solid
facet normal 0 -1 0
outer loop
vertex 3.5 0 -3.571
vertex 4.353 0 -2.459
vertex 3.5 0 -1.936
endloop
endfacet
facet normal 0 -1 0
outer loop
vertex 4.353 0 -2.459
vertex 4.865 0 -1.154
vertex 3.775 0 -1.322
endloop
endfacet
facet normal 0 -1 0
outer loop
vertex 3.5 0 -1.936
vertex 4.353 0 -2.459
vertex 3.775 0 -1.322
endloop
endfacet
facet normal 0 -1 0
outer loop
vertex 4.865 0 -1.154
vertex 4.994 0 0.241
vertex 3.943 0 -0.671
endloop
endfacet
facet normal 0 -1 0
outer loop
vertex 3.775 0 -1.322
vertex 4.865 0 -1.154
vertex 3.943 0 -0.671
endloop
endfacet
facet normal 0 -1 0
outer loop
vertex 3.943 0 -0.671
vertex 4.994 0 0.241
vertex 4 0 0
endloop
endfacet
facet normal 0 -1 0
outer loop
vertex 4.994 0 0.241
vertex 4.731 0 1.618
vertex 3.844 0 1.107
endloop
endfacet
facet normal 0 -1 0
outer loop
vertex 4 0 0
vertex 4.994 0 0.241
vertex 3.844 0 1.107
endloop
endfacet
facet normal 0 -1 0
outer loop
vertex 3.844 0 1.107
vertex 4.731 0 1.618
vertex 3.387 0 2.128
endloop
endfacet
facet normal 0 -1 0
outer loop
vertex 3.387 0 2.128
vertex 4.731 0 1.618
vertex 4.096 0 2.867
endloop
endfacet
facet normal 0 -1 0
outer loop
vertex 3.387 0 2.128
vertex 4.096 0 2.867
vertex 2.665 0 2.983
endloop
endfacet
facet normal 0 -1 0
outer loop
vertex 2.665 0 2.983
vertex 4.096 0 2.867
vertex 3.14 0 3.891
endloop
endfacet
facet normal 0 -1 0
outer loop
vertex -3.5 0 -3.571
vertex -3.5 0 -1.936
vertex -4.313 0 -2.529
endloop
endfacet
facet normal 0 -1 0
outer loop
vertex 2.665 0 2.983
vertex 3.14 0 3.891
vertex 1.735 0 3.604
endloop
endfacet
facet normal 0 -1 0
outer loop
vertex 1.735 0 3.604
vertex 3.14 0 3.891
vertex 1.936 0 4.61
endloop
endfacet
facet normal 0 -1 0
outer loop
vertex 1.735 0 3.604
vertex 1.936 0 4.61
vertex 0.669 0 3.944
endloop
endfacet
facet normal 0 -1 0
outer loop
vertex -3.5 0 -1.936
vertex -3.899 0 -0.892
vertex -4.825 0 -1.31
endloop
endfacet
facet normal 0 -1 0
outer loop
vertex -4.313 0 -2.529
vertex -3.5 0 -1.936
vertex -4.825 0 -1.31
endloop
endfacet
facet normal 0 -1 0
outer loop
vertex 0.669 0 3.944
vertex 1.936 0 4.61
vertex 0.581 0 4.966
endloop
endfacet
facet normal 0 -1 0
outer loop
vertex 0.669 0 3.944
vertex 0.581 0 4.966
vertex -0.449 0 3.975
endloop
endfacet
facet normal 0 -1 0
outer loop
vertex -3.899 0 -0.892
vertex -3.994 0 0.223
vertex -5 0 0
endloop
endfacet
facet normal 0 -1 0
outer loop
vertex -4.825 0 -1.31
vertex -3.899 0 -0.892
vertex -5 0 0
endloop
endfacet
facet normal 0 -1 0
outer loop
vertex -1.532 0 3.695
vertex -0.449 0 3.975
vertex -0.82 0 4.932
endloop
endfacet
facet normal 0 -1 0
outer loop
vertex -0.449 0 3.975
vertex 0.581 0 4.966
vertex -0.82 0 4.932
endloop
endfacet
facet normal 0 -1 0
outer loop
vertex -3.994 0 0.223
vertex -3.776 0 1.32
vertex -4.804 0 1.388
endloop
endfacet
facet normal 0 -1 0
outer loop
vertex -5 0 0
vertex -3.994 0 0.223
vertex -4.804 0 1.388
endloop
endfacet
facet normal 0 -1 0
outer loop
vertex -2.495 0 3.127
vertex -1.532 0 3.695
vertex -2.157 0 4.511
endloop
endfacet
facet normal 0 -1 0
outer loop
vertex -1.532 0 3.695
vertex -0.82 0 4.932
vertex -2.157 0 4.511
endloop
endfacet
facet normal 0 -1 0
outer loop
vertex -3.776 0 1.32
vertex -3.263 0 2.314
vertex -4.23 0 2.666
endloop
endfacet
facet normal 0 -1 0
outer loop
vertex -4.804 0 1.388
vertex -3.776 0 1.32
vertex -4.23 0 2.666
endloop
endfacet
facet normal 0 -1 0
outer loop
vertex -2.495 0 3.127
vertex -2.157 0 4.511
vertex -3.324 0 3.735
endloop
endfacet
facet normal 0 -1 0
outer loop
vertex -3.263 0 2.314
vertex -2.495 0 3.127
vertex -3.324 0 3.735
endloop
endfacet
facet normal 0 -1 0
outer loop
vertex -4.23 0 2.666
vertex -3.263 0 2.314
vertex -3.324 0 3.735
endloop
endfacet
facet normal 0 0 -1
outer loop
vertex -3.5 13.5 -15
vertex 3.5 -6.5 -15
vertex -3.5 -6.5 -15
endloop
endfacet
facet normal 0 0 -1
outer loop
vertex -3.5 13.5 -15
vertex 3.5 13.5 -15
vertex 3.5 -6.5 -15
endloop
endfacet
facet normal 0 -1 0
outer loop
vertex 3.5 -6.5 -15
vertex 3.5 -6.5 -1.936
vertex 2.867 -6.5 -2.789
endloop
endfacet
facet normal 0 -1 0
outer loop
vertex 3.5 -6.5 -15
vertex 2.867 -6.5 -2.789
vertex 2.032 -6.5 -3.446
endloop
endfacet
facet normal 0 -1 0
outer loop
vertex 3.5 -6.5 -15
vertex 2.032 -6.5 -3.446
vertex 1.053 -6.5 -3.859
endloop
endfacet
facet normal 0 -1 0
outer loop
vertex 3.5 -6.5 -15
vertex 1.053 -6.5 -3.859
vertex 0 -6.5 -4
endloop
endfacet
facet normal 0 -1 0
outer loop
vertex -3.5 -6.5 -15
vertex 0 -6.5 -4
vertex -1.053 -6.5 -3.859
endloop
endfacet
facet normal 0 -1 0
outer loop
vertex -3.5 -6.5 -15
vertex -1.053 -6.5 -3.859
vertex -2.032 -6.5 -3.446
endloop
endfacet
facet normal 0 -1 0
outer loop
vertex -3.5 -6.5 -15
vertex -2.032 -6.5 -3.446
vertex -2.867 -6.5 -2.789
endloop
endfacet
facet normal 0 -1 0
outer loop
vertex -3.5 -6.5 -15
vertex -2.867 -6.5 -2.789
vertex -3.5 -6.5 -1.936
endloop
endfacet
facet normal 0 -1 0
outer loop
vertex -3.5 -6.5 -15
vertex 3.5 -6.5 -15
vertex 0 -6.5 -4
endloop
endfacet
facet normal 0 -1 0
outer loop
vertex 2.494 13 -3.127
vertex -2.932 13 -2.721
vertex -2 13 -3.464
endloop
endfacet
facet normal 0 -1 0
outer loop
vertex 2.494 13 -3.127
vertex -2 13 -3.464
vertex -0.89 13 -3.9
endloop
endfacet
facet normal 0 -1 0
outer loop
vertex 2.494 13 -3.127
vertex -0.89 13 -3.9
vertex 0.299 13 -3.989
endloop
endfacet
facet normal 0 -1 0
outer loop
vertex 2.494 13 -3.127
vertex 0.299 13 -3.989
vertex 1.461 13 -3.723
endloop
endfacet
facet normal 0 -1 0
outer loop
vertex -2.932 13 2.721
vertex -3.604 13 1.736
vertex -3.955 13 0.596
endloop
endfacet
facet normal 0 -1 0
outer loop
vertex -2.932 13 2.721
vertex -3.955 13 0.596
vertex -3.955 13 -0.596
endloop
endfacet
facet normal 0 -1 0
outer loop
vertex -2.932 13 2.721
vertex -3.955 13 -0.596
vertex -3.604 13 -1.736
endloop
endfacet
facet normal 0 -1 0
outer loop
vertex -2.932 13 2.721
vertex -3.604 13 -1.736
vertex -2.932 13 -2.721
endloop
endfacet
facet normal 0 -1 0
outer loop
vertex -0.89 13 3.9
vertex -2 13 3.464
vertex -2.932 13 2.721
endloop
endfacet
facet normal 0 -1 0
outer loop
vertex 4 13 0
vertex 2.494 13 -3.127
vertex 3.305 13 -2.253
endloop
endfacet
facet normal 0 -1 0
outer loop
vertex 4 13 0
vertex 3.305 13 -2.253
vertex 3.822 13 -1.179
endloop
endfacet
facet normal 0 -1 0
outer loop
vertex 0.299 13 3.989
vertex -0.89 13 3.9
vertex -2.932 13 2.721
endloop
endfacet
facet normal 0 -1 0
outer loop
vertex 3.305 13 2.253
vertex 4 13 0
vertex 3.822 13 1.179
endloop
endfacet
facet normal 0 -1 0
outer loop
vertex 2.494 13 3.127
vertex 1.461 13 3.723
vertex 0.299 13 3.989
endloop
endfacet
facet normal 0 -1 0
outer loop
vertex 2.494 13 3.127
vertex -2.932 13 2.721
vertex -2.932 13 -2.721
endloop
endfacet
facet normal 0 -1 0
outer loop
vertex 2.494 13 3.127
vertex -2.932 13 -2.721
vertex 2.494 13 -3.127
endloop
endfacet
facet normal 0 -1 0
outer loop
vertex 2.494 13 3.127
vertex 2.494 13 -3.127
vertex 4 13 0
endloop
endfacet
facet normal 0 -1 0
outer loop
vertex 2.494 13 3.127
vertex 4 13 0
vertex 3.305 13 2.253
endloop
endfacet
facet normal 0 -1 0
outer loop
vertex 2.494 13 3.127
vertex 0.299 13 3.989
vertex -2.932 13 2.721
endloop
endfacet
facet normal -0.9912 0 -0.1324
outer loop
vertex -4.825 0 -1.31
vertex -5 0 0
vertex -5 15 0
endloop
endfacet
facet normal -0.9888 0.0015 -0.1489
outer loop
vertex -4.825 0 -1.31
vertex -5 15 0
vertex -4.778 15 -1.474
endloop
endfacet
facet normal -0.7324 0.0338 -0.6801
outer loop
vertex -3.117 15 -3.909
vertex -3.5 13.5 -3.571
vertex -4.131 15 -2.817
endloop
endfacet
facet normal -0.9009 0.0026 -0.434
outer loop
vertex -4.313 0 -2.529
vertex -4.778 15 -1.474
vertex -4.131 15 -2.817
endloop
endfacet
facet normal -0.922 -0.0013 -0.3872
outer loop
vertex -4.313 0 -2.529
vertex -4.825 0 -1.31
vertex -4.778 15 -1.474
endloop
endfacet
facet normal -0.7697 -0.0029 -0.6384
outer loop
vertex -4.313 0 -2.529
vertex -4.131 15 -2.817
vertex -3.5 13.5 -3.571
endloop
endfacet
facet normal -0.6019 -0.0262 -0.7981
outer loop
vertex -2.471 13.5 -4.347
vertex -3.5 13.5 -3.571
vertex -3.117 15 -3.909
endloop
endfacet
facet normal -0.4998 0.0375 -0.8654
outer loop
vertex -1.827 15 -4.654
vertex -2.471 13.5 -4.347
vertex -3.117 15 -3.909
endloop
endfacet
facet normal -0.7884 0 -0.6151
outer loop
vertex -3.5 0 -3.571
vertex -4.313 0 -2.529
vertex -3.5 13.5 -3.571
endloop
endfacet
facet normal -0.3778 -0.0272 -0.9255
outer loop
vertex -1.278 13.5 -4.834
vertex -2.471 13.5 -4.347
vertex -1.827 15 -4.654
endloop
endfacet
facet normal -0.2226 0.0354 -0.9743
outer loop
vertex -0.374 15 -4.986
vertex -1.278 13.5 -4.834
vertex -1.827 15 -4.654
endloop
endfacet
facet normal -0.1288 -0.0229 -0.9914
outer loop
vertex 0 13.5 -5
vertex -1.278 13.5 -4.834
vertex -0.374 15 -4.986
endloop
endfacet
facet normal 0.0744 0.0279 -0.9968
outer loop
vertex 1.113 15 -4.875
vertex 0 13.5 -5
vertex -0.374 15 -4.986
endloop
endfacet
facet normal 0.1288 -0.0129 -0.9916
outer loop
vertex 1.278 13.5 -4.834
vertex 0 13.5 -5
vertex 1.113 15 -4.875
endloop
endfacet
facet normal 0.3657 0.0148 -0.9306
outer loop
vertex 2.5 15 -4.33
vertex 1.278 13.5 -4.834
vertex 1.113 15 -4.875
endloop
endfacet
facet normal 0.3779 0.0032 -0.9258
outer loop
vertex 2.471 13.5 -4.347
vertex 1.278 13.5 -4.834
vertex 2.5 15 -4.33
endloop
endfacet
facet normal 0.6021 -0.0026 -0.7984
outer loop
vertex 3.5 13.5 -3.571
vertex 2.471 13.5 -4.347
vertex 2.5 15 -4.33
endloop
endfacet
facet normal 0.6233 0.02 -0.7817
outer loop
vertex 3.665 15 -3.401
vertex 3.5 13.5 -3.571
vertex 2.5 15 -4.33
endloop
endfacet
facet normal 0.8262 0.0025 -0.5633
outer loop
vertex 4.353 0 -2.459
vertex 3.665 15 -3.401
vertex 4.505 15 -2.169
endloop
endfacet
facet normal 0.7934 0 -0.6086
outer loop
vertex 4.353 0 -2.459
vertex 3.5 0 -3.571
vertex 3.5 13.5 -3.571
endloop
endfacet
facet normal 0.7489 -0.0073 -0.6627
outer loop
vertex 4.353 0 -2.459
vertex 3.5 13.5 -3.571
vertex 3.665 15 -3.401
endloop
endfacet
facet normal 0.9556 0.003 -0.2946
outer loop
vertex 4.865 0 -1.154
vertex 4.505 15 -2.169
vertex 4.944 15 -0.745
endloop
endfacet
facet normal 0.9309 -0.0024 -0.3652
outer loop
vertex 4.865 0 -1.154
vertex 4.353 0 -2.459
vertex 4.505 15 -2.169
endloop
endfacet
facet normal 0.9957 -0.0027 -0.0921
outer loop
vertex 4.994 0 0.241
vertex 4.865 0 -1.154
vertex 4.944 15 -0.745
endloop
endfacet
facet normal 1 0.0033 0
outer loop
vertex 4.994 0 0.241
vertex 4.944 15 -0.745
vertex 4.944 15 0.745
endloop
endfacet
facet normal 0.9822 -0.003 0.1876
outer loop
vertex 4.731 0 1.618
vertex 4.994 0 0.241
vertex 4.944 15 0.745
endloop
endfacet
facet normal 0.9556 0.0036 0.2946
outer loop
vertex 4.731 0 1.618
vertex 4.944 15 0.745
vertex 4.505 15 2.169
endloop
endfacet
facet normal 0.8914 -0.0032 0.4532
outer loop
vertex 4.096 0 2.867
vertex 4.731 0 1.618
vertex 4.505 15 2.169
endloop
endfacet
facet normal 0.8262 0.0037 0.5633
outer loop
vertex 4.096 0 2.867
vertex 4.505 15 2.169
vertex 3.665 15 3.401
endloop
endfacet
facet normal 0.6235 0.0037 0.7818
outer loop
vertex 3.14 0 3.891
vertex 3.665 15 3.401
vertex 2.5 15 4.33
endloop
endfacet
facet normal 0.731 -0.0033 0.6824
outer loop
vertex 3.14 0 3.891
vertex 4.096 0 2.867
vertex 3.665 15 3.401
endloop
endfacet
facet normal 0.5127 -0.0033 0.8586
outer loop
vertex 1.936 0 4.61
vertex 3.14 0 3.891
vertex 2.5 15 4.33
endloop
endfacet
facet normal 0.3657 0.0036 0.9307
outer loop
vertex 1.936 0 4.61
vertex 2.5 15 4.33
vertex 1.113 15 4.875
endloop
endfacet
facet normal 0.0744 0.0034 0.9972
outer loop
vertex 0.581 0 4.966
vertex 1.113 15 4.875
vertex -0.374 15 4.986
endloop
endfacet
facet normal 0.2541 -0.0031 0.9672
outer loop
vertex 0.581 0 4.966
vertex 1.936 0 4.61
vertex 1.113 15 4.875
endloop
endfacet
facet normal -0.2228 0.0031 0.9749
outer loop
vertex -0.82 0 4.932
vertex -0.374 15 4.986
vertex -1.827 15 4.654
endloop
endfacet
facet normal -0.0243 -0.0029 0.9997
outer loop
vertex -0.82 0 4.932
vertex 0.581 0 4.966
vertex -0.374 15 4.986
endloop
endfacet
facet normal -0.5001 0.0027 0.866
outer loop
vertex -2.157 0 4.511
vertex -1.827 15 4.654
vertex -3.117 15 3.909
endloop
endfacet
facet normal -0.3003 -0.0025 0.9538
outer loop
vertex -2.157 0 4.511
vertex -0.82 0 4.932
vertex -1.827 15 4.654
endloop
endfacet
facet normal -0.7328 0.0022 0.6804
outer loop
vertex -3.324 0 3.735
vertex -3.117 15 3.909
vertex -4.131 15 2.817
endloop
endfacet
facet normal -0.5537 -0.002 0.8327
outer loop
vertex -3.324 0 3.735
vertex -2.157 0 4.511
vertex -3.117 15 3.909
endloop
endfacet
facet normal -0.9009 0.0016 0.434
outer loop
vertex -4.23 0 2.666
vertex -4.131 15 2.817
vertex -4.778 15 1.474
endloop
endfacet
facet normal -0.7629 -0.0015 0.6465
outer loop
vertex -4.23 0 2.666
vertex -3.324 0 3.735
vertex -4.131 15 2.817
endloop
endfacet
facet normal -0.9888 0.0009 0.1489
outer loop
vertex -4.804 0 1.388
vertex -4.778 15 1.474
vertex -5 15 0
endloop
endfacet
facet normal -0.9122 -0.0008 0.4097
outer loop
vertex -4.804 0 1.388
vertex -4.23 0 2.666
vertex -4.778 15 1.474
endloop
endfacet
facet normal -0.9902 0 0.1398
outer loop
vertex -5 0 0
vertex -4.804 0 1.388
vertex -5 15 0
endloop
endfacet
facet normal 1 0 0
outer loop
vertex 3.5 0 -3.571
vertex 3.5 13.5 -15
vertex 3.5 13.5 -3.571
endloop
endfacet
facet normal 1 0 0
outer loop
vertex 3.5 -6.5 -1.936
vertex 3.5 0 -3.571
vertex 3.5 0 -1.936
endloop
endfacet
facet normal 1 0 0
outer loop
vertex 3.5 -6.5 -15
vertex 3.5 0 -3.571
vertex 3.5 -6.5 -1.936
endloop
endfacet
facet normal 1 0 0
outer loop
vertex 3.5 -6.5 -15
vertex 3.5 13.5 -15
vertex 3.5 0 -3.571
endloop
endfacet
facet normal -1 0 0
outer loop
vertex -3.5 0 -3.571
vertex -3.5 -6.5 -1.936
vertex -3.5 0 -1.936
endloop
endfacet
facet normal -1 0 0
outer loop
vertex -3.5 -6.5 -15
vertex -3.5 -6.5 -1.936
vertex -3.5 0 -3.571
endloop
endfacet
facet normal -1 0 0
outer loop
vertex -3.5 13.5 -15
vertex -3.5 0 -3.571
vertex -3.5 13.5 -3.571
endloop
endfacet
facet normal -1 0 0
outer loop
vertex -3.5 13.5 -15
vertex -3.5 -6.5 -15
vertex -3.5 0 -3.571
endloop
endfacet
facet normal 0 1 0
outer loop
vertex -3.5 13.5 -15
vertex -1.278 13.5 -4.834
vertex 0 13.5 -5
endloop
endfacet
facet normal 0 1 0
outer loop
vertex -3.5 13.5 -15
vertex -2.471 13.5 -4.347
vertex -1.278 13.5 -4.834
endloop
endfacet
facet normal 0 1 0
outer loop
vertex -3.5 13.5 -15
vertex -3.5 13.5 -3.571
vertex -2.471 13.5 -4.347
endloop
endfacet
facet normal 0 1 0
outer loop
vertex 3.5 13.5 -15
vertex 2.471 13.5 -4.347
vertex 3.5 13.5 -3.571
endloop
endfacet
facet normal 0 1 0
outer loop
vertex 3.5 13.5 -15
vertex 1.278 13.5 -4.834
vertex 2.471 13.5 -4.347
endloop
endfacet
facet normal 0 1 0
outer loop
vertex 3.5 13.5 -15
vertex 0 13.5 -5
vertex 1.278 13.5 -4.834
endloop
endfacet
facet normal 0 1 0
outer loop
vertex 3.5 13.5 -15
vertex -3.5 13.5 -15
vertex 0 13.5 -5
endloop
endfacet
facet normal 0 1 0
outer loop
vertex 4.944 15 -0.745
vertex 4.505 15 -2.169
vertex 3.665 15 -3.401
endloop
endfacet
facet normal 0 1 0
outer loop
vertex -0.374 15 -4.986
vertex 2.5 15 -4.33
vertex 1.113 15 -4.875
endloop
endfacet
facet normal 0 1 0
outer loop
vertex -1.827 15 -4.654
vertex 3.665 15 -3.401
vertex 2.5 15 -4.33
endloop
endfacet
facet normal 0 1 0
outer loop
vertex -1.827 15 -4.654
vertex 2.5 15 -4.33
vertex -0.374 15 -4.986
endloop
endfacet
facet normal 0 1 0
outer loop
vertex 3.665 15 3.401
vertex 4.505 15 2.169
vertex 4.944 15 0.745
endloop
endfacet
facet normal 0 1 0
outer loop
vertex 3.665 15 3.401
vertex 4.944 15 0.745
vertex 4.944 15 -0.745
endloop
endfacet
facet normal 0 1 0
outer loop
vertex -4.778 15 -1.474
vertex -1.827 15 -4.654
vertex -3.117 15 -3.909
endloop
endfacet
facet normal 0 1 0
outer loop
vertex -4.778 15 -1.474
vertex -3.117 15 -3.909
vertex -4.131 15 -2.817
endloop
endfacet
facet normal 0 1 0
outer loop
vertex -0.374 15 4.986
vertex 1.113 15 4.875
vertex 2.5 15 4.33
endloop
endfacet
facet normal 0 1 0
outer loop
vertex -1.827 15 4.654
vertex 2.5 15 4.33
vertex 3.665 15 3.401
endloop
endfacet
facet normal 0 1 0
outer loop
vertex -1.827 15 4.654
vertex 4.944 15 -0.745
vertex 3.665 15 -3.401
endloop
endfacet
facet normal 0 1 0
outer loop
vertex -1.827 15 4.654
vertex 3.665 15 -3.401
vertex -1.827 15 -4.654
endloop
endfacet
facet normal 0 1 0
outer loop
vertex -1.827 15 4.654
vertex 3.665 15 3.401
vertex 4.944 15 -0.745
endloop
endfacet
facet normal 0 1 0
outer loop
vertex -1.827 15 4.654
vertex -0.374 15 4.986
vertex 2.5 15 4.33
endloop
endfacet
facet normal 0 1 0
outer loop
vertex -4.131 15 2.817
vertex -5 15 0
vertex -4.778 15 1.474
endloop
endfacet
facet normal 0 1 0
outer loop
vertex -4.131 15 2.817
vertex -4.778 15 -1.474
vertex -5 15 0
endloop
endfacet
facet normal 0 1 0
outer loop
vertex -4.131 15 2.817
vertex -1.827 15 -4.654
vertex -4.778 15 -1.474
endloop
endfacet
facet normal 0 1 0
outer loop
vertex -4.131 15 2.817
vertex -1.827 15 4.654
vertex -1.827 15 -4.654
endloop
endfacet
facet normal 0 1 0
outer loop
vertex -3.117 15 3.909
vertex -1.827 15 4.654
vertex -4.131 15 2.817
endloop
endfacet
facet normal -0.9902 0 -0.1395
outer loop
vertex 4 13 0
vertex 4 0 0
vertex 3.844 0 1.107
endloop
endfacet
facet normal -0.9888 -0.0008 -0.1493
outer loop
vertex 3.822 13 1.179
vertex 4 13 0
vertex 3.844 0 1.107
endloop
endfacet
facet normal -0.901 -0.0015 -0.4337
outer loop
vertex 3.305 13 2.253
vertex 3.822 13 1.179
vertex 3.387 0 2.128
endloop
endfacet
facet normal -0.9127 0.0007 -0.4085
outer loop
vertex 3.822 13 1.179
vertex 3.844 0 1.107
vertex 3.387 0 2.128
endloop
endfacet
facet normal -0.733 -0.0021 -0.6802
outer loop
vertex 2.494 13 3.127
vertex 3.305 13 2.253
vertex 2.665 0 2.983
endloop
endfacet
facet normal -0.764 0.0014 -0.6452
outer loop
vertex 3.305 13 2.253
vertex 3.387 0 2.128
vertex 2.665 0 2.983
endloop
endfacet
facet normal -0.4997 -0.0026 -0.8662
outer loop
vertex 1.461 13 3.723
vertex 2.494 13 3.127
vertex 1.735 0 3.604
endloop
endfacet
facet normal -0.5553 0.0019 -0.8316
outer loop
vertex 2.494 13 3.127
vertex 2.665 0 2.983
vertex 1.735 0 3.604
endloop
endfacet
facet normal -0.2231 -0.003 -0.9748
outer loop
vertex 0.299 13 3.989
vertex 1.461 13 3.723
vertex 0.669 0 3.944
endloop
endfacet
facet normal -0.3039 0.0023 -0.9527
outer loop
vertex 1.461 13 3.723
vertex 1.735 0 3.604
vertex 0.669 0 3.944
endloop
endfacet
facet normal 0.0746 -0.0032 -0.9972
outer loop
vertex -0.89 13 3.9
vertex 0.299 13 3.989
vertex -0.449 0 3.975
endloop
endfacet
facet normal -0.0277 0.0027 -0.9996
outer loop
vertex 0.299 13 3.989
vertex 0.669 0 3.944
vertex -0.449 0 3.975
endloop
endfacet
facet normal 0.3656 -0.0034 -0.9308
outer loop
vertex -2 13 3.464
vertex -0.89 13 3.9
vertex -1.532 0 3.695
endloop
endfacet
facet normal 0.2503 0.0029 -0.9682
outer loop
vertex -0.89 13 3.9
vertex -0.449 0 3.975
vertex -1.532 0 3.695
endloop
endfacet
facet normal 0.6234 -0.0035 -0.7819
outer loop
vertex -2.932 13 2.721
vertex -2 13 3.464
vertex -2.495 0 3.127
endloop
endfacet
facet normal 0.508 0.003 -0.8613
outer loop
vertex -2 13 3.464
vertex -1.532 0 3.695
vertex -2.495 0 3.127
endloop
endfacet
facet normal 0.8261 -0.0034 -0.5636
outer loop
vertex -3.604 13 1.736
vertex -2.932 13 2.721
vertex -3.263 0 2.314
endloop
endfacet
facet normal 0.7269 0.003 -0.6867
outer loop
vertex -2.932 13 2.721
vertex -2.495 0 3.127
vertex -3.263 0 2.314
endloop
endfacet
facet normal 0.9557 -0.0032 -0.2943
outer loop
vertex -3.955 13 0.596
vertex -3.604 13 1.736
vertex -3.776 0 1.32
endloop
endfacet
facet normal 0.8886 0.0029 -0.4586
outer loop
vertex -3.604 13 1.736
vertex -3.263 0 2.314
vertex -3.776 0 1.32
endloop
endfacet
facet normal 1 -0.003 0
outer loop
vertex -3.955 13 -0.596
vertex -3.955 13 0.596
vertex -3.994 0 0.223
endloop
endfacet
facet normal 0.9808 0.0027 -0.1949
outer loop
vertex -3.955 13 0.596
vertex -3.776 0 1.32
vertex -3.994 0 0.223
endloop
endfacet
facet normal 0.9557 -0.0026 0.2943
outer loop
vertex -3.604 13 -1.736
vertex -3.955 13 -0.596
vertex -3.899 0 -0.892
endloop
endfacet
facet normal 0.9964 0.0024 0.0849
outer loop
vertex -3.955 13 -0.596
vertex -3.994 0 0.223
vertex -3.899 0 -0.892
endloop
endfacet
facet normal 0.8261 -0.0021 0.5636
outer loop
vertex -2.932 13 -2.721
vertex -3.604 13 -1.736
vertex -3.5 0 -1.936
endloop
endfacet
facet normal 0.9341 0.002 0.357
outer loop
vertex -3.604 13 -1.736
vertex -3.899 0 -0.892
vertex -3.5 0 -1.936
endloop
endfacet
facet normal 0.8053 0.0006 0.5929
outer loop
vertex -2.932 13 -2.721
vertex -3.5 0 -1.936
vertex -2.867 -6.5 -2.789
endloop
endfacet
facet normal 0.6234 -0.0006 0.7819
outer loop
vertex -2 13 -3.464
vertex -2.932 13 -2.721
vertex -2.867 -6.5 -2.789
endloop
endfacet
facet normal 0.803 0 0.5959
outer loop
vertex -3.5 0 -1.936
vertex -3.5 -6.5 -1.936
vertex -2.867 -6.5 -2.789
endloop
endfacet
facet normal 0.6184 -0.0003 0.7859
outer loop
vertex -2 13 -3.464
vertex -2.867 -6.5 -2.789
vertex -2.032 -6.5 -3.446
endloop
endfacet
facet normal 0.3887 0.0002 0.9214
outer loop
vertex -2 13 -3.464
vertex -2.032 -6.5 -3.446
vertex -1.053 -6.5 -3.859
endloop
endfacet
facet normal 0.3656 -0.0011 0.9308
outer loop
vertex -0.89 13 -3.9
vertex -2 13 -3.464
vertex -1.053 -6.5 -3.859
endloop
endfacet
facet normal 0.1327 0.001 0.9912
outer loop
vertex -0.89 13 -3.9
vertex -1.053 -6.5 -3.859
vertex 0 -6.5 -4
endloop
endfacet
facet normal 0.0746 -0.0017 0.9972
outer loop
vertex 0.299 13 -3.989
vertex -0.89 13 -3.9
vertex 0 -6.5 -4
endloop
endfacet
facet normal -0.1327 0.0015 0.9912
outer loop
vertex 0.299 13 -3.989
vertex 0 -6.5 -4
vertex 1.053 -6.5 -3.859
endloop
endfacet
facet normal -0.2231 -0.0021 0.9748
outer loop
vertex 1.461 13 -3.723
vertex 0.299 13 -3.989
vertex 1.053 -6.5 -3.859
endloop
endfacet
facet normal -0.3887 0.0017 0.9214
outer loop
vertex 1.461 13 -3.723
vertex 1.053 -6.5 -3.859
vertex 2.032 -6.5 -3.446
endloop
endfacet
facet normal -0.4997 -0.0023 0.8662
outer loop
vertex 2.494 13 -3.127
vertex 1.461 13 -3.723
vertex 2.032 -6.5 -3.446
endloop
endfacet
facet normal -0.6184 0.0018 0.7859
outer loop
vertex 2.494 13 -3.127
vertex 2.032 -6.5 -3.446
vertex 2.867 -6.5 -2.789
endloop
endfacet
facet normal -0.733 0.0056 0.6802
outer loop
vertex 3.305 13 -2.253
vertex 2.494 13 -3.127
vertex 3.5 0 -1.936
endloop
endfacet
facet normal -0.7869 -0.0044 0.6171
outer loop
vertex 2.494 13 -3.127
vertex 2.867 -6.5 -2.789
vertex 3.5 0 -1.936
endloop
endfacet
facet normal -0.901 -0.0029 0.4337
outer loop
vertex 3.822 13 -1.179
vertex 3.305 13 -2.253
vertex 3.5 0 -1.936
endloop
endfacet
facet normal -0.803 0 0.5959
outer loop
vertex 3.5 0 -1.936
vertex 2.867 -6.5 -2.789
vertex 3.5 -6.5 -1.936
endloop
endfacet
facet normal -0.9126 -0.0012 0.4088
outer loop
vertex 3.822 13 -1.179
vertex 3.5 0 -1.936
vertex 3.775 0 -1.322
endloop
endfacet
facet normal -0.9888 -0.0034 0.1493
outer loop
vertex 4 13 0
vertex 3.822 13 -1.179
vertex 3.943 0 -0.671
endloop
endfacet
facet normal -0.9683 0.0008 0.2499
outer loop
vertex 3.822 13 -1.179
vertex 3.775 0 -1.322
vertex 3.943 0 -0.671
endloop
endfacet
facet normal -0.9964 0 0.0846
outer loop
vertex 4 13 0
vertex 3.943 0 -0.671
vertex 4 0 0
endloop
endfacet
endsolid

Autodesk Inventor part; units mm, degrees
ref_plane "YZ Plane" through (0, 0, 0) normal (1, 0, 0) x (0, 1, 0)
ref_plane "XZ Plane" through (0, 0, 0) normal (0, 1, 0) x (-1, 0, 0)
ref_plane "XY Plane" through (0, 0, 0) normal (0, 0, 1) x (1, 0, 0)
sketch "スケッチ1" plane through (0, 0, 0) normal (0, 1, 0) x (-1, 0, 0)
  circle A0 centre (0, 0) radius 5
  dimension "d0" = 10
extrude "押し出し1" add sketch "スケッチ1" along normal blind 15
sketch "スケッチ2" plane through (0, 15, 0) normal (0, 1, 0) x (1, 0, 0)
  line L0 (0, 0) -> (0, 5)
  circle A0 centre (0, 0) radius 5 projected
sketch "スケッチ3" plane through (0, 15, 0) normal (0, 1, 0) x (1, 0, 0)
  point P0 (0, 0)
sketch "スケッチ4" plane through (0, 0, 0) normal (0, -1, 0) x (1, 0, 0)
  line L0 (0, 0) -> (0, -5)
  circle A0 centre (0, 0) radius 5 projected
ref_plane "作業平面1" through (0, 0, -5) normal (0, 0, -1) x (-1, 0, 0)
sketch "スケッチ5" plane through (0, 0, -5) normal (0, 0, -1) x (-1, 0, 0)
  line L0 (5, 15) -> (-5, 15) projected
  line L1 (0, 15) -> (0, 0)
sketch "スケッチ7" plane through (0, 0, 0) normal (0, -1, 0) x (1, 0, 0)
  circle A0 centre (0, 0) radius 4
  dimension "d3" = 8
sketch "スケッチ8" plane through (0, 0, -5) normal (0, 0, -1) x (-1, 0, 0)
  line L0 (3.5, 13.5) -> (-3.5, 13.5)
  line L1 (-3.5, 13.5) -> (-3.5, -6.5)
  line L2 (-3.5, -6.5) -> (3.5, -6.5)
  line L3 (3.5, -6.5) -> (3.5, 13.5)
  line L4 (5, 15) -> (-5, 15) projected
  line L5 (0, 15) -> (0, 0) projected
  line L6 (5, 0) -> (5, 15) projected
  line L7 (5, 15) -> (-5, 15) projected
  line L8 (5, 0) -> (-5, 0) projected
  dimension "d6" = 1.5
  dimension "d7" = 7
  dimension "d8" = 20
extrude "押し出し4" add sketch "スケッチ8" against normal blind 5 contours L3 L8 L5 L0 | L5 L8 L1 L0 | L3 L2 L1 L8
extrude "押し出し5" cut sketch "スケッチ7" along normal mid plane 26
extrude "押し出し6" add sketch "スケッチ8" along normal blind 10 contours L3 L8 L5 L0 | L5 L8 L1 L0 | L3 L2 L1 L8
properties part number "tale outer"
